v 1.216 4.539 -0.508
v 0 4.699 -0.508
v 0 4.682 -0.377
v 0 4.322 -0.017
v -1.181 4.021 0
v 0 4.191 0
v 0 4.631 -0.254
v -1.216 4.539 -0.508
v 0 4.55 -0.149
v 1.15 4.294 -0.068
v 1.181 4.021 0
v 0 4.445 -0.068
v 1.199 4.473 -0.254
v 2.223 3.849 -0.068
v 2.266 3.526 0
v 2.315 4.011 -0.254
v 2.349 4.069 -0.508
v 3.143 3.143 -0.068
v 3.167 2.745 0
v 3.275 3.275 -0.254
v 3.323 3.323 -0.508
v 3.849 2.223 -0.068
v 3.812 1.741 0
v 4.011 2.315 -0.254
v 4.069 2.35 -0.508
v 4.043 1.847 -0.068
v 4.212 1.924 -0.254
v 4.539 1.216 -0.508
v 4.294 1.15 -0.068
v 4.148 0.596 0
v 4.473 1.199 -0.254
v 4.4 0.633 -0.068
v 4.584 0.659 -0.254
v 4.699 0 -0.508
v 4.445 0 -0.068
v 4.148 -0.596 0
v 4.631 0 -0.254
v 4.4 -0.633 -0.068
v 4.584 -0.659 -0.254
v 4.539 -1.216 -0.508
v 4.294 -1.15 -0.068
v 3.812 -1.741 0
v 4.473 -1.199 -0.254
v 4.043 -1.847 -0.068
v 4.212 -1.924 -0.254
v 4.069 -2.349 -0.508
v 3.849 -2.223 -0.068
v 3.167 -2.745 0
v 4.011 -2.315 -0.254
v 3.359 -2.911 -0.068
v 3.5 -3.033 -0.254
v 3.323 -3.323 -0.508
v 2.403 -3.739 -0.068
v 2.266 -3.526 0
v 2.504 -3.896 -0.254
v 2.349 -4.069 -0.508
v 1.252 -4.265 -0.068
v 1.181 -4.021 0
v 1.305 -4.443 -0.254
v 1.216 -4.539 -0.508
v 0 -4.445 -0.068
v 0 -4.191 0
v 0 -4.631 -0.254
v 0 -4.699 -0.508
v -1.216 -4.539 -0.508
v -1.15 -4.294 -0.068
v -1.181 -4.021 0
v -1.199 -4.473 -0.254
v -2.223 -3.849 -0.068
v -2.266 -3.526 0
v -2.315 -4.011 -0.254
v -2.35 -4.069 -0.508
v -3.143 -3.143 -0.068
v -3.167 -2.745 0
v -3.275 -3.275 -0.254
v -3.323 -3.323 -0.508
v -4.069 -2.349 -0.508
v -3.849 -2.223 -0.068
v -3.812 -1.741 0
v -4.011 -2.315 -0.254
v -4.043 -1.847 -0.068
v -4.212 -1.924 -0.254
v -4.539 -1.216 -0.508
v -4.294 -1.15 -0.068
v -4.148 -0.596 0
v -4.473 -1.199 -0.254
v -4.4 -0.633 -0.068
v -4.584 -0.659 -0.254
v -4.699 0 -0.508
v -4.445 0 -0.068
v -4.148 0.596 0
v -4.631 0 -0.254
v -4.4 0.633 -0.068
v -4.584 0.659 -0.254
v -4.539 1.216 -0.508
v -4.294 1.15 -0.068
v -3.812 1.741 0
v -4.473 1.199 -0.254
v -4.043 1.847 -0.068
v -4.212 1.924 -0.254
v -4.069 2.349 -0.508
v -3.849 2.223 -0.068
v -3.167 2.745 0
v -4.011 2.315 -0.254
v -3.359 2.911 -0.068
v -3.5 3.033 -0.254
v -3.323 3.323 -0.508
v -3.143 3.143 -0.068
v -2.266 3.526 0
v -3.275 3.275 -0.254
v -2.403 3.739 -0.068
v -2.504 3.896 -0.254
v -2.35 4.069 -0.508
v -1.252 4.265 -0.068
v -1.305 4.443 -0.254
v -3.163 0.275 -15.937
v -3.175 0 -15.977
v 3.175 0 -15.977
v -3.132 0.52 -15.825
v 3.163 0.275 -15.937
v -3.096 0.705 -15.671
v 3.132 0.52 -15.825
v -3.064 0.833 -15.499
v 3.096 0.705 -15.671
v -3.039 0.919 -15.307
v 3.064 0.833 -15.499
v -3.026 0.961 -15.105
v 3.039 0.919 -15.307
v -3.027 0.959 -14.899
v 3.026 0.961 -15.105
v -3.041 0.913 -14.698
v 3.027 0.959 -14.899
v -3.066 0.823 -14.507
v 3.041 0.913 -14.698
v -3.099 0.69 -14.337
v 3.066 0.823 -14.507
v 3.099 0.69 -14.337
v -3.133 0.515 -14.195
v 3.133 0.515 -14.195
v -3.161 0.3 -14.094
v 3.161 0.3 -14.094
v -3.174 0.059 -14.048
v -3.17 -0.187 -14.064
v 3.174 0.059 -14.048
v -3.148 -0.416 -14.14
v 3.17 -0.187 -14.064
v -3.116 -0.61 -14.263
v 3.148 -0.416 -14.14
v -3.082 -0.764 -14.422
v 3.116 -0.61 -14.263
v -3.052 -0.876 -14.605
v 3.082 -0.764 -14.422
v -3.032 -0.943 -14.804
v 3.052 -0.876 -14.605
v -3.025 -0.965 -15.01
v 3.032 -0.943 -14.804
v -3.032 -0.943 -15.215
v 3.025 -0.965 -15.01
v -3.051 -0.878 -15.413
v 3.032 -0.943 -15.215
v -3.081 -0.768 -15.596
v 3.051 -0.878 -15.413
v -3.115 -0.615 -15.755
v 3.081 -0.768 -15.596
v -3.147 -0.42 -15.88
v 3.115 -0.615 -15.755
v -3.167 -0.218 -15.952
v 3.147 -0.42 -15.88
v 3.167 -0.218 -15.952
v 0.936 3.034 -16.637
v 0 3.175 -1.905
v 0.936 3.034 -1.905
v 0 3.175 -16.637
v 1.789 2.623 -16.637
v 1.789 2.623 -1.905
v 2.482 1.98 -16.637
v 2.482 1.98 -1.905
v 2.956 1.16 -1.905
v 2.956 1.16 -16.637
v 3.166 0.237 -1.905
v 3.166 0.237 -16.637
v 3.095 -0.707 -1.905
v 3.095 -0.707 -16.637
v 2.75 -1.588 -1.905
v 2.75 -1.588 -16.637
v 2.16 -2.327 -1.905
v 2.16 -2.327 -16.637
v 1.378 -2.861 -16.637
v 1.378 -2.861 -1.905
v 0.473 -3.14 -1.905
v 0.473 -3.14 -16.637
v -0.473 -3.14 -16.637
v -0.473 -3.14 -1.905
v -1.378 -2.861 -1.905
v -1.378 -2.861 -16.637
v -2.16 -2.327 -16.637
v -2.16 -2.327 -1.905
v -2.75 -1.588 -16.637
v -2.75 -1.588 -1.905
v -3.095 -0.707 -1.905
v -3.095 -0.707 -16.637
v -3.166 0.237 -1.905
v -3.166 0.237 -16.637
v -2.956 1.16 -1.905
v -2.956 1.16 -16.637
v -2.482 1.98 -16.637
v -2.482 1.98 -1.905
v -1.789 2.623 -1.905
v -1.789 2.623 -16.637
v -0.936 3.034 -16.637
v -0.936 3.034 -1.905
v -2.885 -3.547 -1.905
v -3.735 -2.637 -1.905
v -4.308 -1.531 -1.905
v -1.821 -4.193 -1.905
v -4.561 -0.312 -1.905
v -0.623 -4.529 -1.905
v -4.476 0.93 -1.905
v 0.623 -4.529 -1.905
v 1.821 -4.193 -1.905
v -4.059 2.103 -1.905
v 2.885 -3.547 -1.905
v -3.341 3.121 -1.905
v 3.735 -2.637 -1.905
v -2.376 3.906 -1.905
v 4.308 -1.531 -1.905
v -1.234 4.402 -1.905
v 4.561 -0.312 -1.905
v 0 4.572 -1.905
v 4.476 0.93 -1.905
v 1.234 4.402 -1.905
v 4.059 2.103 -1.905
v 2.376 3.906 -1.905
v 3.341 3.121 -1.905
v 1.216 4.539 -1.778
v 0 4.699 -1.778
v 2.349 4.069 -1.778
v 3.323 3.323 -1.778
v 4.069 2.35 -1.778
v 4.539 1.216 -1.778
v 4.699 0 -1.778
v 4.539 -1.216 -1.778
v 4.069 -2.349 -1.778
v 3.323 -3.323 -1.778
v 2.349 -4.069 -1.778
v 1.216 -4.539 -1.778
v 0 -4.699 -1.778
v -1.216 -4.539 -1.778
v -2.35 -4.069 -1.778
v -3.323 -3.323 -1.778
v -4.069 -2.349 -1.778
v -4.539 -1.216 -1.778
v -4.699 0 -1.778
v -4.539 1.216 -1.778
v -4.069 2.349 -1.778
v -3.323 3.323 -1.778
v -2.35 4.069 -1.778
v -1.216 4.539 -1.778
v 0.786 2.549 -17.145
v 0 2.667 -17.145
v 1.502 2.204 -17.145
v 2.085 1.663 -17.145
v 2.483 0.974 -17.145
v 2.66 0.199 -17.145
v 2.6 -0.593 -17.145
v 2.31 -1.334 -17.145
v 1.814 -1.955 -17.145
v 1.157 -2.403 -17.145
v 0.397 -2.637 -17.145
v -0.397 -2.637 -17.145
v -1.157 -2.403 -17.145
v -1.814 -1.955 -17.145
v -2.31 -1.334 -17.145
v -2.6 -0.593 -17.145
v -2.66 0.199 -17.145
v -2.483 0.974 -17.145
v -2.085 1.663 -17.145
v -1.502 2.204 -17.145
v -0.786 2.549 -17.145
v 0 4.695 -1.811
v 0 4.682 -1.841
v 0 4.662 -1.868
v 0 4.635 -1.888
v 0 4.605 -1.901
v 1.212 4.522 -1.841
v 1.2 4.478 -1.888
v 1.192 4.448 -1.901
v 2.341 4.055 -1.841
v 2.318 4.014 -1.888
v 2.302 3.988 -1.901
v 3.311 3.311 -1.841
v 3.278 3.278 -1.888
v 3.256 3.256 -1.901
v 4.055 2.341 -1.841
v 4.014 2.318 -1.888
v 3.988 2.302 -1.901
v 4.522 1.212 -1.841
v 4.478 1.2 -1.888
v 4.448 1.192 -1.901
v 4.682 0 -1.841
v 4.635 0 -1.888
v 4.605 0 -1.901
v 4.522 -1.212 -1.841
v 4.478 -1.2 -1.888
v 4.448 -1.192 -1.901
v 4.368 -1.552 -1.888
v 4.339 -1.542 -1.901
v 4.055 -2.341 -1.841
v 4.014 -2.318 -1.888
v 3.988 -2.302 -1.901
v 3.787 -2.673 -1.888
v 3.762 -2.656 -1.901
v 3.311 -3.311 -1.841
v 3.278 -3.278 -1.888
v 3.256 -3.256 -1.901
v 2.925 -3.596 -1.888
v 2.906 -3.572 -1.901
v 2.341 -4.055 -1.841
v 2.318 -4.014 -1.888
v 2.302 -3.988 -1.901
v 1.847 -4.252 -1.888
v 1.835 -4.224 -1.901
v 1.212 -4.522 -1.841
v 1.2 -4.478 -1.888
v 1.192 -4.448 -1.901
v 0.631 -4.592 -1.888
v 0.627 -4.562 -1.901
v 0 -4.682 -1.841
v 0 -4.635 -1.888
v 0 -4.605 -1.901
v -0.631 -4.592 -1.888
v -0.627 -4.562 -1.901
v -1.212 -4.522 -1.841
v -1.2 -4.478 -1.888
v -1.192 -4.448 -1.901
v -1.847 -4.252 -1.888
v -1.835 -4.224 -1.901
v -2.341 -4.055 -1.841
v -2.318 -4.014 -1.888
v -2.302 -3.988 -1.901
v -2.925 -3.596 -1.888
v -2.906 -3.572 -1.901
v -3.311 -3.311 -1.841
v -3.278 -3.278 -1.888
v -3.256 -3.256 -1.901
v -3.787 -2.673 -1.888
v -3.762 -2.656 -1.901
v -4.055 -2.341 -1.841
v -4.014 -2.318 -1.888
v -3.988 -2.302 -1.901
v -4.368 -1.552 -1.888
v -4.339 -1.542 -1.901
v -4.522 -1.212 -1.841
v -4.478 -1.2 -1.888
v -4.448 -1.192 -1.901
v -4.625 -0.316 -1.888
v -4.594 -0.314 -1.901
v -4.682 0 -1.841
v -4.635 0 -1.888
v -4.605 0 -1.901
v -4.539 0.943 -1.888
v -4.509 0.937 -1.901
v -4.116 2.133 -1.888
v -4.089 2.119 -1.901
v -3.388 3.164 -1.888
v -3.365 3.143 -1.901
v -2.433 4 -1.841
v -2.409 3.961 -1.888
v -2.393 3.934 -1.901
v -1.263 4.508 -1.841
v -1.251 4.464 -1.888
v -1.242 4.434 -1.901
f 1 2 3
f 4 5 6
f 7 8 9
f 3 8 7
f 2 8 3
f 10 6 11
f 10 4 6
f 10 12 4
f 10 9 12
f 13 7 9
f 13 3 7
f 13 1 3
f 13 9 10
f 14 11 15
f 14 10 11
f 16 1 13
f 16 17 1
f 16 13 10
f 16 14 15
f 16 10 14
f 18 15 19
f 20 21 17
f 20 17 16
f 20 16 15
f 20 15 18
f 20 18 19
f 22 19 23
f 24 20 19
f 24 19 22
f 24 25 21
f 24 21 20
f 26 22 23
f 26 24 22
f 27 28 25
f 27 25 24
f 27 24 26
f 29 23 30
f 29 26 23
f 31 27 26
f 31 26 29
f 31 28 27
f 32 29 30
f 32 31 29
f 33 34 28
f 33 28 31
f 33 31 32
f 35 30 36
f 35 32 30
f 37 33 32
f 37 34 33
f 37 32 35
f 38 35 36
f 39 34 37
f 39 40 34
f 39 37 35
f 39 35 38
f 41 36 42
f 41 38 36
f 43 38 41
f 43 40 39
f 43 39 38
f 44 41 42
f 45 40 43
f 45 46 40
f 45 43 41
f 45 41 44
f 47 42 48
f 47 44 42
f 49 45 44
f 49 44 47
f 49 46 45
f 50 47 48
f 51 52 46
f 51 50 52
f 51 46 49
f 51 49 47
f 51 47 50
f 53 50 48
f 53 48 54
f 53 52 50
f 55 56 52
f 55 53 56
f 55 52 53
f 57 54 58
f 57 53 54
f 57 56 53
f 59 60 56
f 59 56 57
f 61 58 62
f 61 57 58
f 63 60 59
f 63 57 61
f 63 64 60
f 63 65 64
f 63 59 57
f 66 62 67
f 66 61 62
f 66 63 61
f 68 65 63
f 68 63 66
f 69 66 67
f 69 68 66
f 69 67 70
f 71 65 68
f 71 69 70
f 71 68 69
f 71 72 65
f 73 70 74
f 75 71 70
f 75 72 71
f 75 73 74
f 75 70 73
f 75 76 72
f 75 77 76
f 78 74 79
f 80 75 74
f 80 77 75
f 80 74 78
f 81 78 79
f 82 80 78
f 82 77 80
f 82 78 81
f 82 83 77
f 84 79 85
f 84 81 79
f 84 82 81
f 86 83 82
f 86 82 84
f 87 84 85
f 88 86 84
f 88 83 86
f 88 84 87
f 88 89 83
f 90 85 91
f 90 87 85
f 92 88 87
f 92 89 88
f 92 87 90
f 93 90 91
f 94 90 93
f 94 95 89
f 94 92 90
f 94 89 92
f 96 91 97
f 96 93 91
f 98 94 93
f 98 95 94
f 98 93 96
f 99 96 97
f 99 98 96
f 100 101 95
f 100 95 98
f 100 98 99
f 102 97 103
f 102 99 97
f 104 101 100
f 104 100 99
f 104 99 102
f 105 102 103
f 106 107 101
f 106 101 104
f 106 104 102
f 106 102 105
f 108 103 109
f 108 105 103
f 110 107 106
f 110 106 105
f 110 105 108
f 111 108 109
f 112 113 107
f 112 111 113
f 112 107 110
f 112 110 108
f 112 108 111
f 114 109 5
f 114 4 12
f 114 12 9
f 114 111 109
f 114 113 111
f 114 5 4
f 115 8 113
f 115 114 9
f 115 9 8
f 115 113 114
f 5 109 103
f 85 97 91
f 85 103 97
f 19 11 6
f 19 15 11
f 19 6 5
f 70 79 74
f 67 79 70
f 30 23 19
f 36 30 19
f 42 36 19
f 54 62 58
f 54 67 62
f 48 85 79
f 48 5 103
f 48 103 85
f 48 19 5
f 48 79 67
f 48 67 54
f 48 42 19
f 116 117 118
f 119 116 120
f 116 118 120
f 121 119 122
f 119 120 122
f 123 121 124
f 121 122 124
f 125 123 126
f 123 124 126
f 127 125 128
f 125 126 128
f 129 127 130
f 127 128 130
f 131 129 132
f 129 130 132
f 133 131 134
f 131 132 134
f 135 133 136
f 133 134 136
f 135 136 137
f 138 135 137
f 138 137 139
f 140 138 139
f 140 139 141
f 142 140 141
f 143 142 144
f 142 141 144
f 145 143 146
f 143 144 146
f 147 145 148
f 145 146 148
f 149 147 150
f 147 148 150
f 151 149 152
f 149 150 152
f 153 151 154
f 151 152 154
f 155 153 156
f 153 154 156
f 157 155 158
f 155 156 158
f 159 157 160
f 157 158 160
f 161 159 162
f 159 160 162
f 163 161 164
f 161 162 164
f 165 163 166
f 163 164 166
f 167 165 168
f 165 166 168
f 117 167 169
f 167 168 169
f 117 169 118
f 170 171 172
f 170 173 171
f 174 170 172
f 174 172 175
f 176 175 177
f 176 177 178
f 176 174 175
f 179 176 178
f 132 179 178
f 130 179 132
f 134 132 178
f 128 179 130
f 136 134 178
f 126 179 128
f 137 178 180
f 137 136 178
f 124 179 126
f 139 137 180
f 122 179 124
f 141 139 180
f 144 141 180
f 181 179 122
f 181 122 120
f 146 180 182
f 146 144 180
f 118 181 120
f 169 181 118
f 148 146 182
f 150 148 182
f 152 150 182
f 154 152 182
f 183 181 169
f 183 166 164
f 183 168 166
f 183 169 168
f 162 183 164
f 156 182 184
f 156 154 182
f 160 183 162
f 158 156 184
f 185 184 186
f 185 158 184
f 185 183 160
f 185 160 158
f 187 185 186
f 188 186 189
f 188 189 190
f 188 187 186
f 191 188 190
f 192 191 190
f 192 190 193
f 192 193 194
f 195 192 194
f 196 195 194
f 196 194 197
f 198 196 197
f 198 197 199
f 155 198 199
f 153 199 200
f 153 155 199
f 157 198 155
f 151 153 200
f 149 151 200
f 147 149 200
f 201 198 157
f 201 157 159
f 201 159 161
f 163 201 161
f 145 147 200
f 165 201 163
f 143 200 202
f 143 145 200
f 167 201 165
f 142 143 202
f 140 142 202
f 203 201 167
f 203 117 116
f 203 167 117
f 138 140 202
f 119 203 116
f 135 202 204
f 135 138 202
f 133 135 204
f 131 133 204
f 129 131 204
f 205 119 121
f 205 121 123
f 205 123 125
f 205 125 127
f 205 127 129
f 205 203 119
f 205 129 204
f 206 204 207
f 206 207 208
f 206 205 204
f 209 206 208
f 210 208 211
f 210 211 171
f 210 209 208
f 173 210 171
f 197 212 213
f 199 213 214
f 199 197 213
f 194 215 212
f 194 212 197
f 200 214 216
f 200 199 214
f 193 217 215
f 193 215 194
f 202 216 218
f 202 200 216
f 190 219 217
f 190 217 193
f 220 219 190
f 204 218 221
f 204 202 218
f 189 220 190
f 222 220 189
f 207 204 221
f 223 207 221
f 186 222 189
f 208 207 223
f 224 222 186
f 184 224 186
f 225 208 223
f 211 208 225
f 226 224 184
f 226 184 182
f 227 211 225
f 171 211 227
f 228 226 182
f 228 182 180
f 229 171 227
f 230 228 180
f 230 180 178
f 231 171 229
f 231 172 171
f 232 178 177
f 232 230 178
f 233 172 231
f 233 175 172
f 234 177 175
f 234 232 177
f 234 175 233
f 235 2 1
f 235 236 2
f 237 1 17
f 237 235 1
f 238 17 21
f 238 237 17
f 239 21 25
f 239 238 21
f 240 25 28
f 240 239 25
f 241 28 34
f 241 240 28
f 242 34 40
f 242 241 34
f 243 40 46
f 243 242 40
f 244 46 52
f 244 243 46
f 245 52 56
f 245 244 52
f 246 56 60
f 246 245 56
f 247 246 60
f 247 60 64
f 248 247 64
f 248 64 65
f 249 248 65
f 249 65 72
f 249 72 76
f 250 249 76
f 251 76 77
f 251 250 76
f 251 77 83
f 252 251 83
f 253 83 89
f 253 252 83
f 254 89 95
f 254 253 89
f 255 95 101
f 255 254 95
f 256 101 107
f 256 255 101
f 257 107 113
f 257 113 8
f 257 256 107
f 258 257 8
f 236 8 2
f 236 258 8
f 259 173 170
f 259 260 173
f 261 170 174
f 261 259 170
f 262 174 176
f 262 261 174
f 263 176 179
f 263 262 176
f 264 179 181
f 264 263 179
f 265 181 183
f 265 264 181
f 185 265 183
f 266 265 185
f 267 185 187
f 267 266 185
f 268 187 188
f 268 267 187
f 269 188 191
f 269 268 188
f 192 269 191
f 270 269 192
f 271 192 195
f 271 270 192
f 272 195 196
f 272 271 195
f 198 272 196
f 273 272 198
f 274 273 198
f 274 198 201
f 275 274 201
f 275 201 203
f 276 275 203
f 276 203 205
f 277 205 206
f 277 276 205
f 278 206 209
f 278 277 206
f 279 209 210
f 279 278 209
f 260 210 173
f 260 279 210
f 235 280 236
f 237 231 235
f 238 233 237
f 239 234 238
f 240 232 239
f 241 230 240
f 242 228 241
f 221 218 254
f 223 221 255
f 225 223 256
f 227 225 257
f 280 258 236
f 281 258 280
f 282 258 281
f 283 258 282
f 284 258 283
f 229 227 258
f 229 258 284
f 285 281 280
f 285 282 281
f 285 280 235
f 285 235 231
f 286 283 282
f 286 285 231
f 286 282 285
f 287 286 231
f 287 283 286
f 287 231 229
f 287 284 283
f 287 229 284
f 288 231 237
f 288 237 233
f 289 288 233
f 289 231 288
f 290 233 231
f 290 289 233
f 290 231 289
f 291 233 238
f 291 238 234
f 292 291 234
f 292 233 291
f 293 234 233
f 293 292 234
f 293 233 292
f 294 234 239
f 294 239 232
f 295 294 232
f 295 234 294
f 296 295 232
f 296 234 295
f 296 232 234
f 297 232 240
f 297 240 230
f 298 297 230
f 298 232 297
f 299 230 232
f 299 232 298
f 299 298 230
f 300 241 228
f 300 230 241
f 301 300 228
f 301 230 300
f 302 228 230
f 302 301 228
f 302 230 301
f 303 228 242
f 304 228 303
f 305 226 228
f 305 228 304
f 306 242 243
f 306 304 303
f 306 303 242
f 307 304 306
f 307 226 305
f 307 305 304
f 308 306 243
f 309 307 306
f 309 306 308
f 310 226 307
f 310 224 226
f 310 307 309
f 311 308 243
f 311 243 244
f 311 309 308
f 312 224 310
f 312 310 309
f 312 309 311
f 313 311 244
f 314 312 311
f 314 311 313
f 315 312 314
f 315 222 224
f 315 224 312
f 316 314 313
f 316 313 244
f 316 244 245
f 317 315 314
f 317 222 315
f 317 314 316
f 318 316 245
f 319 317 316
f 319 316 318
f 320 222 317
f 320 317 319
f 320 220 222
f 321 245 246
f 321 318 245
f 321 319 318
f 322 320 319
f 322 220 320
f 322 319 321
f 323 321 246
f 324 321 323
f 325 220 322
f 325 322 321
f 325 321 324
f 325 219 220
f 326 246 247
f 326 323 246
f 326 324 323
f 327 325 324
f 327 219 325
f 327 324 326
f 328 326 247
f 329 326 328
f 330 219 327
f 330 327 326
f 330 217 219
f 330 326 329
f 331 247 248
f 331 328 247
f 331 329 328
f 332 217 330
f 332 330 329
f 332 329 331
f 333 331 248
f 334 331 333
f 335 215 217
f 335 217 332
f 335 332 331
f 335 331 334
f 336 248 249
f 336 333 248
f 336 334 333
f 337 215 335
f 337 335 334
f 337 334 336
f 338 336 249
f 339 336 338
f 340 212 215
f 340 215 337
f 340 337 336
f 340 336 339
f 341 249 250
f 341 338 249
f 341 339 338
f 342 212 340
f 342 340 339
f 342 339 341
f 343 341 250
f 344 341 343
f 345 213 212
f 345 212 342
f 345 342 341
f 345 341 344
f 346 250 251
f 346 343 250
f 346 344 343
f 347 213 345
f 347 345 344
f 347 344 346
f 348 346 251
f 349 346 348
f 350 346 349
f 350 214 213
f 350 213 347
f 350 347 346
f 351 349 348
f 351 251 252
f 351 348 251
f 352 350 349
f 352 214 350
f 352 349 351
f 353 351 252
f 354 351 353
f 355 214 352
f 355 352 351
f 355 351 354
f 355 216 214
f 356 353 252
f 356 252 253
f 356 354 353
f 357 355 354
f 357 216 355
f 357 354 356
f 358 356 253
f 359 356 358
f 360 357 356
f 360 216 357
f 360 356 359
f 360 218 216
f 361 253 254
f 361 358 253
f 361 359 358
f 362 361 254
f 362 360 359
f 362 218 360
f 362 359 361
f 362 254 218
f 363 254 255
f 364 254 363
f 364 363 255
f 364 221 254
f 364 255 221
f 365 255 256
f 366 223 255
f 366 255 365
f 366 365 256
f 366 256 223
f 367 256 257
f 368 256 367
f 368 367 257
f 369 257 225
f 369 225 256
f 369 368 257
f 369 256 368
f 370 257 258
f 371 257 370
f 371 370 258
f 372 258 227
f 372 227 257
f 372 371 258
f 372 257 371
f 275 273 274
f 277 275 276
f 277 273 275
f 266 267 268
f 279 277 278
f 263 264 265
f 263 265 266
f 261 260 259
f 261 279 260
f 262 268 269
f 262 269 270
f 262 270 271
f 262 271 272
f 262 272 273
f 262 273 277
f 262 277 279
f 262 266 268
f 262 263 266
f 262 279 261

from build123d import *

# Parameters (mm, degrees)
SKETCH2_R           = 0.9652
EXTRUDE1_DEPTH      = 5.699
EXTRUDE1_DEPTH_BACK = 5.6990001


with BuildPart() as part:
    # Sketch1 → Revolve Base (revolve)
    with BuildSketch(Plane(origin=(0, 0, 0), x_dir=(0, 0, -1), z_dir=(1, 0, 0))):
        with BuildLine():
            Line((0, 0), (0, 4.191))
            ThreePointArc((0, 4.191), (0.148789755, 4.550210245), (0.508, 4.699))
            Line((0.508, 4.699), (1.778, 4.699))
            ThreePointArc((1.778, 4.699), (1.867802561, 4.661802561), (1.905, 4.572))
            Line((1.905, 4.572), (1.905, 3.175))
            Line((1.905, 3.175), (16.637, 3.175))
            Line((16.637, 3.175), (17.145, 2.667))
            Line((17.145, 2.667), (17.145, 0))
            Line((17.145, 0), (0, 0))
        make_face()
    revolve(axis=Axis((0, 0, 0), (0, 0, -1)))

    # Sketch2 → Extrude1 (cut, two sides)
    with BuildSketch(Plane(origin=(0, 0, 0), x_dir=(0, 0, -1), z_dir=(1, 0, 0))) as extrude1_sk:
        with Locations((15.0114, 0)):
            Circle(SKETCH2_R)
    extrude(amount=EXTRUDE1_DEPTH, mode=Mode.SUBTRACT)
    extrude(extrude1_sk.sketch, amount=-EXTRUDE1_DEPTH_BACK, mode=Mode.SUBTRACT)


solid = part.part
